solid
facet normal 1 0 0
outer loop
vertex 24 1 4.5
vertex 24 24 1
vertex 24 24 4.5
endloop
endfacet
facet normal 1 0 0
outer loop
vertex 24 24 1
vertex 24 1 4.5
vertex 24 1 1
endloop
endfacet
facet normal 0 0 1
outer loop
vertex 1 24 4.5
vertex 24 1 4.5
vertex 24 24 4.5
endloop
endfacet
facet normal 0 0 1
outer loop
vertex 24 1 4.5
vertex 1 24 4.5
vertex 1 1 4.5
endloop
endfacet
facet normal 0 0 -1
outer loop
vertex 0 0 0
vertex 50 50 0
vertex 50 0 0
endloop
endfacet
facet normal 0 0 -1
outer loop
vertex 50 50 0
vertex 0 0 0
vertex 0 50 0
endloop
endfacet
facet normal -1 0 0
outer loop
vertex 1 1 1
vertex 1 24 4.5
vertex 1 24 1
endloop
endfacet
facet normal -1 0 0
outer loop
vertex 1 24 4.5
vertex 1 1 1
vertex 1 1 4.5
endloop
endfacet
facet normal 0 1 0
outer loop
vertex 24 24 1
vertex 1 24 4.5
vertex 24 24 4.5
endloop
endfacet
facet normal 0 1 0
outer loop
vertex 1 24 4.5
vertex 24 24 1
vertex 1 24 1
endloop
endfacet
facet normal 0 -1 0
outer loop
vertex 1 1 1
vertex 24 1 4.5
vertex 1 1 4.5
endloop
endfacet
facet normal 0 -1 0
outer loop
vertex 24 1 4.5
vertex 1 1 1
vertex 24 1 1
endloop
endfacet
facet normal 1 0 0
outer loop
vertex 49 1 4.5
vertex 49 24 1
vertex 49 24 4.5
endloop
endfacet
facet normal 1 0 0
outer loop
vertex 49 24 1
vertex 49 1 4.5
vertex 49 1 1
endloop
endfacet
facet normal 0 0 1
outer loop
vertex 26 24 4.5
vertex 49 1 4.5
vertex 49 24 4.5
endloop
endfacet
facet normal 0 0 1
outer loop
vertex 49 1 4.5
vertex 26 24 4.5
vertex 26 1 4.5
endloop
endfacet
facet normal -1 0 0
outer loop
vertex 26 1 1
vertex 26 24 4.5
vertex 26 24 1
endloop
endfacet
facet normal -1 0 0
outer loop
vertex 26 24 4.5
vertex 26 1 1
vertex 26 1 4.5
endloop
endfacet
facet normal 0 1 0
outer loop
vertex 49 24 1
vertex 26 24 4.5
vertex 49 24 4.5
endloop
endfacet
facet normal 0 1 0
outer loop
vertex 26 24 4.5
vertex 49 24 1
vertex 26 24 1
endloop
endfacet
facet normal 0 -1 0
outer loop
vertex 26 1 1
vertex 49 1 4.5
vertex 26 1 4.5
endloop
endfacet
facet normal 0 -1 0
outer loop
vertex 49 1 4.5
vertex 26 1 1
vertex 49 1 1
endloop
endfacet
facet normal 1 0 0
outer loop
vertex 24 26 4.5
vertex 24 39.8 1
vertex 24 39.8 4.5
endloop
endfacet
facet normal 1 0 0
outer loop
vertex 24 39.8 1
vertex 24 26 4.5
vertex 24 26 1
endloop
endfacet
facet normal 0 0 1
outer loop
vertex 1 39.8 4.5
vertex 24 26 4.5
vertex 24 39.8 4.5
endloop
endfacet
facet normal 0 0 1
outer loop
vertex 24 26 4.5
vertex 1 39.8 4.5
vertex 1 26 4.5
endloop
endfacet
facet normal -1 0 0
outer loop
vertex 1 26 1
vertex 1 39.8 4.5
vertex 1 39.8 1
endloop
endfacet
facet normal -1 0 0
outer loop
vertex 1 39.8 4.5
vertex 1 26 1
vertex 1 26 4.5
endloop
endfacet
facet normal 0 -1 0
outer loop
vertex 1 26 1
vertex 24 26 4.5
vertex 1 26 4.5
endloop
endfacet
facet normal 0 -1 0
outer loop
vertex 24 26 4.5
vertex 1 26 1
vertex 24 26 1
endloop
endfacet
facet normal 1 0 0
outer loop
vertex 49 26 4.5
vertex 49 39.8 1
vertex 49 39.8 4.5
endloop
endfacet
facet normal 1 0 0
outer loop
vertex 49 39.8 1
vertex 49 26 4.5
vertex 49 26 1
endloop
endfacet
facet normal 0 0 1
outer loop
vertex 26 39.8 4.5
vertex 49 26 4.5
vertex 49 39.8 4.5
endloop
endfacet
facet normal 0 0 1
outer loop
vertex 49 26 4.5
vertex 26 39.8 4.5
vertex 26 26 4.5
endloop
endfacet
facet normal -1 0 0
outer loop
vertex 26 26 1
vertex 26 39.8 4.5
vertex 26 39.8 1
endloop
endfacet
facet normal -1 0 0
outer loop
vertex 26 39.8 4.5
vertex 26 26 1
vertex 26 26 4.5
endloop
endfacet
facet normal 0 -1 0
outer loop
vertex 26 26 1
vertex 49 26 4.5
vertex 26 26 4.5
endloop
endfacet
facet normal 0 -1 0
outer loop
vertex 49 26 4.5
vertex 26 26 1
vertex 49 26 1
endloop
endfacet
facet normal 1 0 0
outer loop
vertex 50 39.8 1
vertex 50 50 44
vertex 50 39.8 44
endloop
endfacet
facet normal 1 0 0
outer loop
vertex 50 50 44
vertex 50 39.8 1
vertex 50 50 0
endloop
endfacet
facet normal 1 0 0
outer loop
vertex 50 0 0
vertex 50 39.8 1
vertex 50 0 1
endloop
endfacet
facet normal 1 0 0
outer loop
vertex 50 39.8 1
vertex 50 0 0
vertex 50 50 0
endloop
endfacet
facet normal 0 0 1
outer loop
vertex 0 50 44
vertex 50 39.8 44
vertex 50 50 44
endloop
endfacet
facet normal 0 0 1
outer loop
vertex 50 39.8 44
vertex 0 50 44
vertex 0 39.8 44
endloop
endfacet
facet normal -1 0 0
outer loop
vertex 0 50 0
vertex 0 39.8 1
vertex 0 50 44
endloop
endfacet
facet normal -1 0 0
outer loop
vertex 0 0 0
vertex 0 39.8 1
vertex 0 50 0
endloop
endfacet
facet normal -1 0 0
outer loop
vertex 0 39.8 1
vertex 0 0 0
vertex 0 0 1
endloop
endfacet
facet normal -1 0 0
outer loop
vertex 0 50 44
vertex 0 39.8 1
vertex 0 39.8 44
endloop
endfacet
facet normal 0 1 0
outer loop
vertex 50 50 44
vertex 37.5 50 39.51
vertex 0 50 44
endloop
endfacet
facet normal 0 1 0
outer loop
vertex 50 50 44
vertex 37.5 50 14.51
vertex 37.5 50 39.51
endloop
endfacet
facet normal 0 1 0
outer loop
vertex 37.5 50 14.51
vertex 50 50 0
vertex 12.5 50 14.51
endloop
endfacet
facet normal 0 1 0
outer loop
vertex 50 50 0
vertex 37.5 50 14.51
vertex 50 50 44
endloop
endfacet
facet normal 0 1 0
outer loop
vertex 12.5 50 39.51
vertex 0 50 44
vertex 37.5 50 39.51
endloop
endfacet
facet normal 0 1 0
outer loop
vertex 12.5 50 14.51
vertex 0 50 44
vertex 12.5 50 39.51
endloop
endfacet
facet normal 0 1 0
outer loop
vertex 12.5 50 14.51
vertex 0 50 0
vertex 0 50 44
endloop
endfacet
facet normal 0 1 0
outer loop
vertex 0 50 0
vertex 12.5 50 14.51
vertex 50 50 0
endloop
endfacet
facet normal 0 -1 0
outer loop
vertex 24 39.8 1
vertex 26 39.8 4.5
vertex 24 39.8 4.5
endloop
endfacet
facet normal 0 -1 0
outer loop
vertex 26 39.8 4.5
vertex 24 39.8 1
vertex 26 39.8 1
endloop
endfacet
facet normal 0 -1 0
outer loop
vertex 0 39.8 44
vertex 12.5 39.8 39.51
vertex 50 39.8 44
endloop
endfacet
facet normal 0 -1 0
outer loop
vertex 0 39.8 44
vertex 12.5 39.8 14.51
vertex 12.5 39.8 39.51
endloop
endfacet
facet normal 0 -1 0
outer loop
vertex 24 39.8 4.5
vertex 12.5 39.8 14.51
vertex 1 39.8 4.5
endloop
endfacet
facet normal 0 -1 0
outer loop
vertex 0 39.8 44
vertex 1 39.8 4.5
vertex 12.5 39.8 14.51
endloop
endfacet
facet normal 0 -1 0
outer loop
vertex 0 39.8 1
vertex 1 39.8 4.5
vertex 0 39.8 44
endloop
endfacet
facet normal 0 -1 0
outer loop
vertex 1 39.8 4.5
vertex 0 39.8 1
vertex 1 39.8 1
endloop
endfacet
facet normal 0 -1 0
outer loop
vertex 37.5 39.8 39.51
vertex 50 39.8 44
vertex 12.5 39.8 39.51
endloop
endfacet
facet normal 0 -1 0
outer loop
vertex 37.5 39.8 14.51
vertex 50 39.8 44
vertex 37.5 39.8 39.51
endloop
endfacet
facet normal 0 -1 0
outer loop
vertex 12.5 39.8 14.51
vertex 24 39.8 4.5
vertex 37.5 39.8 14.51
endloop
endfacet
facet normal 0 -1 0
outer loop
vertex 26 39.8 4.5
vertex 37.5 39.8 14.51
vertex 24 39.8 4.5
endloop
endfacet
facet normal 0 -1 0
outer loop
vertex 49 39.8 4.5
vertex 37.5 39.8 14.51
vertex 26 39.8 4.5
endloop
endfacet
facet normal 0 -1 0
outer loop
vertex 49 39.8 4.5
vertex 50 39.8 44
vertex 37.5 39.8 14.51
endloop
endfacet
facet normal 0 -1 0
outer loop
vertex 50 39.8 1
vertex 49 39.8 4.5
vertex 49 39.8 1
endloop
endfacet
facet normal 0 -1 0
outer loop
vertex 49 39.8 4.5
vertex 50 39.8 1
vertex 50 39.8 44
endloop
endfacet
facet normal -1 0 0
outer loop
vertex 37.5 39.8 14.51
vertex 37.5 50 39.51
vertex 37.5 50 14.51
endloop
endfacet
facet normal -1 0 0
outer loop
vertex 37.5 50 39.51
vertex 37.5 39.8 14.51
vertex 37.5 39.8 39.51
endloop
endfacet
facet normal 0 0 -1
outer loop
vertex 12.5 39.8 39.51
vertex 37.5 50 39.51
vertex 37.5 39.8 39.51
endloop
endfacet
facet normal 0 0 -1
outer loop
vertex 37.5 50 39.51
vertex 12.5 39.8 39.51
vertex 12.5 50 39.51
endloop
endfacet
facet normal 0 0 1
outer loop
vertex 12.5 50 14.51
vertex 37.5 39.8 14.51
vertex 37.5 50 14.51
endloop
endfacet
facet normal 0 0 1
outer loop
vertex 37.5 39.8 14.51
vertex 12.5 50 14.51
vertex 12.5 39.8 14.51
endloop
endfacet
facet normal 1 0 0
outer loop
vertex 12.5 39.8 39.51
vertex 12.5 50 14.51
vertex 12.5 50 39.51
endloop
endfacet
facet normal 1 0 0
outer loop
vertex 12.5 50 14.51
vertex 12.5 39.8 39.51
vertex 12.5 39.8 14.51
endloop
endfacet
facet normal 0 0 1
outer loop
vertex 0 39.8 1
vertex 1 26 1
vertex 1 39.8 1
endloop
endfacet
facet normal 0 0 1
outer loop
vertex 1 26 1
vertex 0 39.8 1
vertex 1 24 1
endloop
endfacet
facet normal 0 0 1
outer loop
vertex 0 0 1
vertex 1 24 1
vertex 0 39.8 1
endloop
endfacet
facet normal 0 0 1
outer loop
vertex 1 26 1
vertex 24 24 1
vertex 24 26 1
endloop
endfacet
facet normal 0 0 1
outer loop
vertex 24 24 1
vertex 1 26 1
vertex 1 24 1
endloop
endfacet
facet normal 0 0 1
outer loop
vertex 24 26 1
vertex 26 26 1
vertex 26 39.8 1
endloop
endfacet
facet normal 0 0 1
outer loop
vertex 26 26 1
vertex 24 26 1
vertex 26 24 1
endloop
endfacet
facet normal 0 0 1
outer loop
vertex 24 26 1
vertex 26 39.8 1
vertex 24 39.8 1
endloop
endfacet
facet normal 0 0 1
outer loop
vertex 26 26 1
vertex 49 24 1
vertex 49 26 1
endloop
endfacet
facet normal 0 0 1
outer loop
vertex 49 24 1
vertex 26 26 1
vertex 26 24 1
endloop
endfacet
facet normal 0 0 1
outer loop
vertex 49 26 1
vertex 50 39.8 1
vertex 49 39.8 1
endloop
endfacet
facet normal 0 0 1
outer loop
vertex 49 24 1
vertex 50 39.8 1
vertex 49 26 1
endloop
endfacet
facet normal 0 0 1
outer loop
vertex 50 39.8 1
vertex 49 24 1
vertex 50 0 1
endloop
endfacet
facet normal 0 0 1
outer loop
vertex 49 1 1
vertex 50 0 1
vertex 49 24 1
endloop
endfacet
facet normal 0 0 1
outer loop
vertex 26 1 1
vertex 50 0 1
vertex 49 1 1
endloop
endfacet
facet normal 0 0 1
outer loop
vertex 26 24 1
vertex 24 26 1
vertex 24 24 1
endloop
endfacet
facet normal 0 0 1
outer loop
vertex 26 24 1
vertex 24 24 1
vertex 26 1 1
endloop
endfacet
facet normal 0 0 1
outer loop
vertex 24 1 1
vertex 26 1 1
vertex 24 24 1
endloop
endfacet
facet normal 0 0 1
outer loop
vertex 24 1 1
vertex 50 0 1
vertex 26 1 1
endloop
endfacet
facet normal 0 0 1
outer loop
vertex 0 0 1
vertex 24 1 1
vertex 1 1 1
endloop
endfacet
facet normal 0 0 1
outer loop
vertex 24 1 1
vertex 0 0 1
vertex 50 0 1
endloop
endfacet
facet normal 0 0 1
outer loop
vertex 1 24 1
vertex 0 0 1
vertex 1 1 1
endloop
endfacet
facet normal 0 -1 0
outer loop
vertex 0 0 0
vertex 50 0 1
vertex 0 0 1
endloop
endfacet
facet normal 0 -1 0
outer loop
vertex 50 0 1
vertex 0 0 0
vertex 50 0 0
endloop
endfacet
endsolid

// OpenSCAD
color("LightGray") {
    translate([1,1,0]) cube([23,23,4.5]);
    translate([25+1,1,0]) cube([23,23,4.5]);
    translate([1,25+1,0]) cube([23,23,4.5]);
    translate([25+1,25+1,0]) cube([23,23,4.5]);
}
color("Grey") {
    cube([50,50,1]);
    difference() {
        translate([0,50-10.2,0]) cube([50,10.2,50-6]);
        translate([12.5,25,4.51+10]) cube([25,50,25]);
    }
}
